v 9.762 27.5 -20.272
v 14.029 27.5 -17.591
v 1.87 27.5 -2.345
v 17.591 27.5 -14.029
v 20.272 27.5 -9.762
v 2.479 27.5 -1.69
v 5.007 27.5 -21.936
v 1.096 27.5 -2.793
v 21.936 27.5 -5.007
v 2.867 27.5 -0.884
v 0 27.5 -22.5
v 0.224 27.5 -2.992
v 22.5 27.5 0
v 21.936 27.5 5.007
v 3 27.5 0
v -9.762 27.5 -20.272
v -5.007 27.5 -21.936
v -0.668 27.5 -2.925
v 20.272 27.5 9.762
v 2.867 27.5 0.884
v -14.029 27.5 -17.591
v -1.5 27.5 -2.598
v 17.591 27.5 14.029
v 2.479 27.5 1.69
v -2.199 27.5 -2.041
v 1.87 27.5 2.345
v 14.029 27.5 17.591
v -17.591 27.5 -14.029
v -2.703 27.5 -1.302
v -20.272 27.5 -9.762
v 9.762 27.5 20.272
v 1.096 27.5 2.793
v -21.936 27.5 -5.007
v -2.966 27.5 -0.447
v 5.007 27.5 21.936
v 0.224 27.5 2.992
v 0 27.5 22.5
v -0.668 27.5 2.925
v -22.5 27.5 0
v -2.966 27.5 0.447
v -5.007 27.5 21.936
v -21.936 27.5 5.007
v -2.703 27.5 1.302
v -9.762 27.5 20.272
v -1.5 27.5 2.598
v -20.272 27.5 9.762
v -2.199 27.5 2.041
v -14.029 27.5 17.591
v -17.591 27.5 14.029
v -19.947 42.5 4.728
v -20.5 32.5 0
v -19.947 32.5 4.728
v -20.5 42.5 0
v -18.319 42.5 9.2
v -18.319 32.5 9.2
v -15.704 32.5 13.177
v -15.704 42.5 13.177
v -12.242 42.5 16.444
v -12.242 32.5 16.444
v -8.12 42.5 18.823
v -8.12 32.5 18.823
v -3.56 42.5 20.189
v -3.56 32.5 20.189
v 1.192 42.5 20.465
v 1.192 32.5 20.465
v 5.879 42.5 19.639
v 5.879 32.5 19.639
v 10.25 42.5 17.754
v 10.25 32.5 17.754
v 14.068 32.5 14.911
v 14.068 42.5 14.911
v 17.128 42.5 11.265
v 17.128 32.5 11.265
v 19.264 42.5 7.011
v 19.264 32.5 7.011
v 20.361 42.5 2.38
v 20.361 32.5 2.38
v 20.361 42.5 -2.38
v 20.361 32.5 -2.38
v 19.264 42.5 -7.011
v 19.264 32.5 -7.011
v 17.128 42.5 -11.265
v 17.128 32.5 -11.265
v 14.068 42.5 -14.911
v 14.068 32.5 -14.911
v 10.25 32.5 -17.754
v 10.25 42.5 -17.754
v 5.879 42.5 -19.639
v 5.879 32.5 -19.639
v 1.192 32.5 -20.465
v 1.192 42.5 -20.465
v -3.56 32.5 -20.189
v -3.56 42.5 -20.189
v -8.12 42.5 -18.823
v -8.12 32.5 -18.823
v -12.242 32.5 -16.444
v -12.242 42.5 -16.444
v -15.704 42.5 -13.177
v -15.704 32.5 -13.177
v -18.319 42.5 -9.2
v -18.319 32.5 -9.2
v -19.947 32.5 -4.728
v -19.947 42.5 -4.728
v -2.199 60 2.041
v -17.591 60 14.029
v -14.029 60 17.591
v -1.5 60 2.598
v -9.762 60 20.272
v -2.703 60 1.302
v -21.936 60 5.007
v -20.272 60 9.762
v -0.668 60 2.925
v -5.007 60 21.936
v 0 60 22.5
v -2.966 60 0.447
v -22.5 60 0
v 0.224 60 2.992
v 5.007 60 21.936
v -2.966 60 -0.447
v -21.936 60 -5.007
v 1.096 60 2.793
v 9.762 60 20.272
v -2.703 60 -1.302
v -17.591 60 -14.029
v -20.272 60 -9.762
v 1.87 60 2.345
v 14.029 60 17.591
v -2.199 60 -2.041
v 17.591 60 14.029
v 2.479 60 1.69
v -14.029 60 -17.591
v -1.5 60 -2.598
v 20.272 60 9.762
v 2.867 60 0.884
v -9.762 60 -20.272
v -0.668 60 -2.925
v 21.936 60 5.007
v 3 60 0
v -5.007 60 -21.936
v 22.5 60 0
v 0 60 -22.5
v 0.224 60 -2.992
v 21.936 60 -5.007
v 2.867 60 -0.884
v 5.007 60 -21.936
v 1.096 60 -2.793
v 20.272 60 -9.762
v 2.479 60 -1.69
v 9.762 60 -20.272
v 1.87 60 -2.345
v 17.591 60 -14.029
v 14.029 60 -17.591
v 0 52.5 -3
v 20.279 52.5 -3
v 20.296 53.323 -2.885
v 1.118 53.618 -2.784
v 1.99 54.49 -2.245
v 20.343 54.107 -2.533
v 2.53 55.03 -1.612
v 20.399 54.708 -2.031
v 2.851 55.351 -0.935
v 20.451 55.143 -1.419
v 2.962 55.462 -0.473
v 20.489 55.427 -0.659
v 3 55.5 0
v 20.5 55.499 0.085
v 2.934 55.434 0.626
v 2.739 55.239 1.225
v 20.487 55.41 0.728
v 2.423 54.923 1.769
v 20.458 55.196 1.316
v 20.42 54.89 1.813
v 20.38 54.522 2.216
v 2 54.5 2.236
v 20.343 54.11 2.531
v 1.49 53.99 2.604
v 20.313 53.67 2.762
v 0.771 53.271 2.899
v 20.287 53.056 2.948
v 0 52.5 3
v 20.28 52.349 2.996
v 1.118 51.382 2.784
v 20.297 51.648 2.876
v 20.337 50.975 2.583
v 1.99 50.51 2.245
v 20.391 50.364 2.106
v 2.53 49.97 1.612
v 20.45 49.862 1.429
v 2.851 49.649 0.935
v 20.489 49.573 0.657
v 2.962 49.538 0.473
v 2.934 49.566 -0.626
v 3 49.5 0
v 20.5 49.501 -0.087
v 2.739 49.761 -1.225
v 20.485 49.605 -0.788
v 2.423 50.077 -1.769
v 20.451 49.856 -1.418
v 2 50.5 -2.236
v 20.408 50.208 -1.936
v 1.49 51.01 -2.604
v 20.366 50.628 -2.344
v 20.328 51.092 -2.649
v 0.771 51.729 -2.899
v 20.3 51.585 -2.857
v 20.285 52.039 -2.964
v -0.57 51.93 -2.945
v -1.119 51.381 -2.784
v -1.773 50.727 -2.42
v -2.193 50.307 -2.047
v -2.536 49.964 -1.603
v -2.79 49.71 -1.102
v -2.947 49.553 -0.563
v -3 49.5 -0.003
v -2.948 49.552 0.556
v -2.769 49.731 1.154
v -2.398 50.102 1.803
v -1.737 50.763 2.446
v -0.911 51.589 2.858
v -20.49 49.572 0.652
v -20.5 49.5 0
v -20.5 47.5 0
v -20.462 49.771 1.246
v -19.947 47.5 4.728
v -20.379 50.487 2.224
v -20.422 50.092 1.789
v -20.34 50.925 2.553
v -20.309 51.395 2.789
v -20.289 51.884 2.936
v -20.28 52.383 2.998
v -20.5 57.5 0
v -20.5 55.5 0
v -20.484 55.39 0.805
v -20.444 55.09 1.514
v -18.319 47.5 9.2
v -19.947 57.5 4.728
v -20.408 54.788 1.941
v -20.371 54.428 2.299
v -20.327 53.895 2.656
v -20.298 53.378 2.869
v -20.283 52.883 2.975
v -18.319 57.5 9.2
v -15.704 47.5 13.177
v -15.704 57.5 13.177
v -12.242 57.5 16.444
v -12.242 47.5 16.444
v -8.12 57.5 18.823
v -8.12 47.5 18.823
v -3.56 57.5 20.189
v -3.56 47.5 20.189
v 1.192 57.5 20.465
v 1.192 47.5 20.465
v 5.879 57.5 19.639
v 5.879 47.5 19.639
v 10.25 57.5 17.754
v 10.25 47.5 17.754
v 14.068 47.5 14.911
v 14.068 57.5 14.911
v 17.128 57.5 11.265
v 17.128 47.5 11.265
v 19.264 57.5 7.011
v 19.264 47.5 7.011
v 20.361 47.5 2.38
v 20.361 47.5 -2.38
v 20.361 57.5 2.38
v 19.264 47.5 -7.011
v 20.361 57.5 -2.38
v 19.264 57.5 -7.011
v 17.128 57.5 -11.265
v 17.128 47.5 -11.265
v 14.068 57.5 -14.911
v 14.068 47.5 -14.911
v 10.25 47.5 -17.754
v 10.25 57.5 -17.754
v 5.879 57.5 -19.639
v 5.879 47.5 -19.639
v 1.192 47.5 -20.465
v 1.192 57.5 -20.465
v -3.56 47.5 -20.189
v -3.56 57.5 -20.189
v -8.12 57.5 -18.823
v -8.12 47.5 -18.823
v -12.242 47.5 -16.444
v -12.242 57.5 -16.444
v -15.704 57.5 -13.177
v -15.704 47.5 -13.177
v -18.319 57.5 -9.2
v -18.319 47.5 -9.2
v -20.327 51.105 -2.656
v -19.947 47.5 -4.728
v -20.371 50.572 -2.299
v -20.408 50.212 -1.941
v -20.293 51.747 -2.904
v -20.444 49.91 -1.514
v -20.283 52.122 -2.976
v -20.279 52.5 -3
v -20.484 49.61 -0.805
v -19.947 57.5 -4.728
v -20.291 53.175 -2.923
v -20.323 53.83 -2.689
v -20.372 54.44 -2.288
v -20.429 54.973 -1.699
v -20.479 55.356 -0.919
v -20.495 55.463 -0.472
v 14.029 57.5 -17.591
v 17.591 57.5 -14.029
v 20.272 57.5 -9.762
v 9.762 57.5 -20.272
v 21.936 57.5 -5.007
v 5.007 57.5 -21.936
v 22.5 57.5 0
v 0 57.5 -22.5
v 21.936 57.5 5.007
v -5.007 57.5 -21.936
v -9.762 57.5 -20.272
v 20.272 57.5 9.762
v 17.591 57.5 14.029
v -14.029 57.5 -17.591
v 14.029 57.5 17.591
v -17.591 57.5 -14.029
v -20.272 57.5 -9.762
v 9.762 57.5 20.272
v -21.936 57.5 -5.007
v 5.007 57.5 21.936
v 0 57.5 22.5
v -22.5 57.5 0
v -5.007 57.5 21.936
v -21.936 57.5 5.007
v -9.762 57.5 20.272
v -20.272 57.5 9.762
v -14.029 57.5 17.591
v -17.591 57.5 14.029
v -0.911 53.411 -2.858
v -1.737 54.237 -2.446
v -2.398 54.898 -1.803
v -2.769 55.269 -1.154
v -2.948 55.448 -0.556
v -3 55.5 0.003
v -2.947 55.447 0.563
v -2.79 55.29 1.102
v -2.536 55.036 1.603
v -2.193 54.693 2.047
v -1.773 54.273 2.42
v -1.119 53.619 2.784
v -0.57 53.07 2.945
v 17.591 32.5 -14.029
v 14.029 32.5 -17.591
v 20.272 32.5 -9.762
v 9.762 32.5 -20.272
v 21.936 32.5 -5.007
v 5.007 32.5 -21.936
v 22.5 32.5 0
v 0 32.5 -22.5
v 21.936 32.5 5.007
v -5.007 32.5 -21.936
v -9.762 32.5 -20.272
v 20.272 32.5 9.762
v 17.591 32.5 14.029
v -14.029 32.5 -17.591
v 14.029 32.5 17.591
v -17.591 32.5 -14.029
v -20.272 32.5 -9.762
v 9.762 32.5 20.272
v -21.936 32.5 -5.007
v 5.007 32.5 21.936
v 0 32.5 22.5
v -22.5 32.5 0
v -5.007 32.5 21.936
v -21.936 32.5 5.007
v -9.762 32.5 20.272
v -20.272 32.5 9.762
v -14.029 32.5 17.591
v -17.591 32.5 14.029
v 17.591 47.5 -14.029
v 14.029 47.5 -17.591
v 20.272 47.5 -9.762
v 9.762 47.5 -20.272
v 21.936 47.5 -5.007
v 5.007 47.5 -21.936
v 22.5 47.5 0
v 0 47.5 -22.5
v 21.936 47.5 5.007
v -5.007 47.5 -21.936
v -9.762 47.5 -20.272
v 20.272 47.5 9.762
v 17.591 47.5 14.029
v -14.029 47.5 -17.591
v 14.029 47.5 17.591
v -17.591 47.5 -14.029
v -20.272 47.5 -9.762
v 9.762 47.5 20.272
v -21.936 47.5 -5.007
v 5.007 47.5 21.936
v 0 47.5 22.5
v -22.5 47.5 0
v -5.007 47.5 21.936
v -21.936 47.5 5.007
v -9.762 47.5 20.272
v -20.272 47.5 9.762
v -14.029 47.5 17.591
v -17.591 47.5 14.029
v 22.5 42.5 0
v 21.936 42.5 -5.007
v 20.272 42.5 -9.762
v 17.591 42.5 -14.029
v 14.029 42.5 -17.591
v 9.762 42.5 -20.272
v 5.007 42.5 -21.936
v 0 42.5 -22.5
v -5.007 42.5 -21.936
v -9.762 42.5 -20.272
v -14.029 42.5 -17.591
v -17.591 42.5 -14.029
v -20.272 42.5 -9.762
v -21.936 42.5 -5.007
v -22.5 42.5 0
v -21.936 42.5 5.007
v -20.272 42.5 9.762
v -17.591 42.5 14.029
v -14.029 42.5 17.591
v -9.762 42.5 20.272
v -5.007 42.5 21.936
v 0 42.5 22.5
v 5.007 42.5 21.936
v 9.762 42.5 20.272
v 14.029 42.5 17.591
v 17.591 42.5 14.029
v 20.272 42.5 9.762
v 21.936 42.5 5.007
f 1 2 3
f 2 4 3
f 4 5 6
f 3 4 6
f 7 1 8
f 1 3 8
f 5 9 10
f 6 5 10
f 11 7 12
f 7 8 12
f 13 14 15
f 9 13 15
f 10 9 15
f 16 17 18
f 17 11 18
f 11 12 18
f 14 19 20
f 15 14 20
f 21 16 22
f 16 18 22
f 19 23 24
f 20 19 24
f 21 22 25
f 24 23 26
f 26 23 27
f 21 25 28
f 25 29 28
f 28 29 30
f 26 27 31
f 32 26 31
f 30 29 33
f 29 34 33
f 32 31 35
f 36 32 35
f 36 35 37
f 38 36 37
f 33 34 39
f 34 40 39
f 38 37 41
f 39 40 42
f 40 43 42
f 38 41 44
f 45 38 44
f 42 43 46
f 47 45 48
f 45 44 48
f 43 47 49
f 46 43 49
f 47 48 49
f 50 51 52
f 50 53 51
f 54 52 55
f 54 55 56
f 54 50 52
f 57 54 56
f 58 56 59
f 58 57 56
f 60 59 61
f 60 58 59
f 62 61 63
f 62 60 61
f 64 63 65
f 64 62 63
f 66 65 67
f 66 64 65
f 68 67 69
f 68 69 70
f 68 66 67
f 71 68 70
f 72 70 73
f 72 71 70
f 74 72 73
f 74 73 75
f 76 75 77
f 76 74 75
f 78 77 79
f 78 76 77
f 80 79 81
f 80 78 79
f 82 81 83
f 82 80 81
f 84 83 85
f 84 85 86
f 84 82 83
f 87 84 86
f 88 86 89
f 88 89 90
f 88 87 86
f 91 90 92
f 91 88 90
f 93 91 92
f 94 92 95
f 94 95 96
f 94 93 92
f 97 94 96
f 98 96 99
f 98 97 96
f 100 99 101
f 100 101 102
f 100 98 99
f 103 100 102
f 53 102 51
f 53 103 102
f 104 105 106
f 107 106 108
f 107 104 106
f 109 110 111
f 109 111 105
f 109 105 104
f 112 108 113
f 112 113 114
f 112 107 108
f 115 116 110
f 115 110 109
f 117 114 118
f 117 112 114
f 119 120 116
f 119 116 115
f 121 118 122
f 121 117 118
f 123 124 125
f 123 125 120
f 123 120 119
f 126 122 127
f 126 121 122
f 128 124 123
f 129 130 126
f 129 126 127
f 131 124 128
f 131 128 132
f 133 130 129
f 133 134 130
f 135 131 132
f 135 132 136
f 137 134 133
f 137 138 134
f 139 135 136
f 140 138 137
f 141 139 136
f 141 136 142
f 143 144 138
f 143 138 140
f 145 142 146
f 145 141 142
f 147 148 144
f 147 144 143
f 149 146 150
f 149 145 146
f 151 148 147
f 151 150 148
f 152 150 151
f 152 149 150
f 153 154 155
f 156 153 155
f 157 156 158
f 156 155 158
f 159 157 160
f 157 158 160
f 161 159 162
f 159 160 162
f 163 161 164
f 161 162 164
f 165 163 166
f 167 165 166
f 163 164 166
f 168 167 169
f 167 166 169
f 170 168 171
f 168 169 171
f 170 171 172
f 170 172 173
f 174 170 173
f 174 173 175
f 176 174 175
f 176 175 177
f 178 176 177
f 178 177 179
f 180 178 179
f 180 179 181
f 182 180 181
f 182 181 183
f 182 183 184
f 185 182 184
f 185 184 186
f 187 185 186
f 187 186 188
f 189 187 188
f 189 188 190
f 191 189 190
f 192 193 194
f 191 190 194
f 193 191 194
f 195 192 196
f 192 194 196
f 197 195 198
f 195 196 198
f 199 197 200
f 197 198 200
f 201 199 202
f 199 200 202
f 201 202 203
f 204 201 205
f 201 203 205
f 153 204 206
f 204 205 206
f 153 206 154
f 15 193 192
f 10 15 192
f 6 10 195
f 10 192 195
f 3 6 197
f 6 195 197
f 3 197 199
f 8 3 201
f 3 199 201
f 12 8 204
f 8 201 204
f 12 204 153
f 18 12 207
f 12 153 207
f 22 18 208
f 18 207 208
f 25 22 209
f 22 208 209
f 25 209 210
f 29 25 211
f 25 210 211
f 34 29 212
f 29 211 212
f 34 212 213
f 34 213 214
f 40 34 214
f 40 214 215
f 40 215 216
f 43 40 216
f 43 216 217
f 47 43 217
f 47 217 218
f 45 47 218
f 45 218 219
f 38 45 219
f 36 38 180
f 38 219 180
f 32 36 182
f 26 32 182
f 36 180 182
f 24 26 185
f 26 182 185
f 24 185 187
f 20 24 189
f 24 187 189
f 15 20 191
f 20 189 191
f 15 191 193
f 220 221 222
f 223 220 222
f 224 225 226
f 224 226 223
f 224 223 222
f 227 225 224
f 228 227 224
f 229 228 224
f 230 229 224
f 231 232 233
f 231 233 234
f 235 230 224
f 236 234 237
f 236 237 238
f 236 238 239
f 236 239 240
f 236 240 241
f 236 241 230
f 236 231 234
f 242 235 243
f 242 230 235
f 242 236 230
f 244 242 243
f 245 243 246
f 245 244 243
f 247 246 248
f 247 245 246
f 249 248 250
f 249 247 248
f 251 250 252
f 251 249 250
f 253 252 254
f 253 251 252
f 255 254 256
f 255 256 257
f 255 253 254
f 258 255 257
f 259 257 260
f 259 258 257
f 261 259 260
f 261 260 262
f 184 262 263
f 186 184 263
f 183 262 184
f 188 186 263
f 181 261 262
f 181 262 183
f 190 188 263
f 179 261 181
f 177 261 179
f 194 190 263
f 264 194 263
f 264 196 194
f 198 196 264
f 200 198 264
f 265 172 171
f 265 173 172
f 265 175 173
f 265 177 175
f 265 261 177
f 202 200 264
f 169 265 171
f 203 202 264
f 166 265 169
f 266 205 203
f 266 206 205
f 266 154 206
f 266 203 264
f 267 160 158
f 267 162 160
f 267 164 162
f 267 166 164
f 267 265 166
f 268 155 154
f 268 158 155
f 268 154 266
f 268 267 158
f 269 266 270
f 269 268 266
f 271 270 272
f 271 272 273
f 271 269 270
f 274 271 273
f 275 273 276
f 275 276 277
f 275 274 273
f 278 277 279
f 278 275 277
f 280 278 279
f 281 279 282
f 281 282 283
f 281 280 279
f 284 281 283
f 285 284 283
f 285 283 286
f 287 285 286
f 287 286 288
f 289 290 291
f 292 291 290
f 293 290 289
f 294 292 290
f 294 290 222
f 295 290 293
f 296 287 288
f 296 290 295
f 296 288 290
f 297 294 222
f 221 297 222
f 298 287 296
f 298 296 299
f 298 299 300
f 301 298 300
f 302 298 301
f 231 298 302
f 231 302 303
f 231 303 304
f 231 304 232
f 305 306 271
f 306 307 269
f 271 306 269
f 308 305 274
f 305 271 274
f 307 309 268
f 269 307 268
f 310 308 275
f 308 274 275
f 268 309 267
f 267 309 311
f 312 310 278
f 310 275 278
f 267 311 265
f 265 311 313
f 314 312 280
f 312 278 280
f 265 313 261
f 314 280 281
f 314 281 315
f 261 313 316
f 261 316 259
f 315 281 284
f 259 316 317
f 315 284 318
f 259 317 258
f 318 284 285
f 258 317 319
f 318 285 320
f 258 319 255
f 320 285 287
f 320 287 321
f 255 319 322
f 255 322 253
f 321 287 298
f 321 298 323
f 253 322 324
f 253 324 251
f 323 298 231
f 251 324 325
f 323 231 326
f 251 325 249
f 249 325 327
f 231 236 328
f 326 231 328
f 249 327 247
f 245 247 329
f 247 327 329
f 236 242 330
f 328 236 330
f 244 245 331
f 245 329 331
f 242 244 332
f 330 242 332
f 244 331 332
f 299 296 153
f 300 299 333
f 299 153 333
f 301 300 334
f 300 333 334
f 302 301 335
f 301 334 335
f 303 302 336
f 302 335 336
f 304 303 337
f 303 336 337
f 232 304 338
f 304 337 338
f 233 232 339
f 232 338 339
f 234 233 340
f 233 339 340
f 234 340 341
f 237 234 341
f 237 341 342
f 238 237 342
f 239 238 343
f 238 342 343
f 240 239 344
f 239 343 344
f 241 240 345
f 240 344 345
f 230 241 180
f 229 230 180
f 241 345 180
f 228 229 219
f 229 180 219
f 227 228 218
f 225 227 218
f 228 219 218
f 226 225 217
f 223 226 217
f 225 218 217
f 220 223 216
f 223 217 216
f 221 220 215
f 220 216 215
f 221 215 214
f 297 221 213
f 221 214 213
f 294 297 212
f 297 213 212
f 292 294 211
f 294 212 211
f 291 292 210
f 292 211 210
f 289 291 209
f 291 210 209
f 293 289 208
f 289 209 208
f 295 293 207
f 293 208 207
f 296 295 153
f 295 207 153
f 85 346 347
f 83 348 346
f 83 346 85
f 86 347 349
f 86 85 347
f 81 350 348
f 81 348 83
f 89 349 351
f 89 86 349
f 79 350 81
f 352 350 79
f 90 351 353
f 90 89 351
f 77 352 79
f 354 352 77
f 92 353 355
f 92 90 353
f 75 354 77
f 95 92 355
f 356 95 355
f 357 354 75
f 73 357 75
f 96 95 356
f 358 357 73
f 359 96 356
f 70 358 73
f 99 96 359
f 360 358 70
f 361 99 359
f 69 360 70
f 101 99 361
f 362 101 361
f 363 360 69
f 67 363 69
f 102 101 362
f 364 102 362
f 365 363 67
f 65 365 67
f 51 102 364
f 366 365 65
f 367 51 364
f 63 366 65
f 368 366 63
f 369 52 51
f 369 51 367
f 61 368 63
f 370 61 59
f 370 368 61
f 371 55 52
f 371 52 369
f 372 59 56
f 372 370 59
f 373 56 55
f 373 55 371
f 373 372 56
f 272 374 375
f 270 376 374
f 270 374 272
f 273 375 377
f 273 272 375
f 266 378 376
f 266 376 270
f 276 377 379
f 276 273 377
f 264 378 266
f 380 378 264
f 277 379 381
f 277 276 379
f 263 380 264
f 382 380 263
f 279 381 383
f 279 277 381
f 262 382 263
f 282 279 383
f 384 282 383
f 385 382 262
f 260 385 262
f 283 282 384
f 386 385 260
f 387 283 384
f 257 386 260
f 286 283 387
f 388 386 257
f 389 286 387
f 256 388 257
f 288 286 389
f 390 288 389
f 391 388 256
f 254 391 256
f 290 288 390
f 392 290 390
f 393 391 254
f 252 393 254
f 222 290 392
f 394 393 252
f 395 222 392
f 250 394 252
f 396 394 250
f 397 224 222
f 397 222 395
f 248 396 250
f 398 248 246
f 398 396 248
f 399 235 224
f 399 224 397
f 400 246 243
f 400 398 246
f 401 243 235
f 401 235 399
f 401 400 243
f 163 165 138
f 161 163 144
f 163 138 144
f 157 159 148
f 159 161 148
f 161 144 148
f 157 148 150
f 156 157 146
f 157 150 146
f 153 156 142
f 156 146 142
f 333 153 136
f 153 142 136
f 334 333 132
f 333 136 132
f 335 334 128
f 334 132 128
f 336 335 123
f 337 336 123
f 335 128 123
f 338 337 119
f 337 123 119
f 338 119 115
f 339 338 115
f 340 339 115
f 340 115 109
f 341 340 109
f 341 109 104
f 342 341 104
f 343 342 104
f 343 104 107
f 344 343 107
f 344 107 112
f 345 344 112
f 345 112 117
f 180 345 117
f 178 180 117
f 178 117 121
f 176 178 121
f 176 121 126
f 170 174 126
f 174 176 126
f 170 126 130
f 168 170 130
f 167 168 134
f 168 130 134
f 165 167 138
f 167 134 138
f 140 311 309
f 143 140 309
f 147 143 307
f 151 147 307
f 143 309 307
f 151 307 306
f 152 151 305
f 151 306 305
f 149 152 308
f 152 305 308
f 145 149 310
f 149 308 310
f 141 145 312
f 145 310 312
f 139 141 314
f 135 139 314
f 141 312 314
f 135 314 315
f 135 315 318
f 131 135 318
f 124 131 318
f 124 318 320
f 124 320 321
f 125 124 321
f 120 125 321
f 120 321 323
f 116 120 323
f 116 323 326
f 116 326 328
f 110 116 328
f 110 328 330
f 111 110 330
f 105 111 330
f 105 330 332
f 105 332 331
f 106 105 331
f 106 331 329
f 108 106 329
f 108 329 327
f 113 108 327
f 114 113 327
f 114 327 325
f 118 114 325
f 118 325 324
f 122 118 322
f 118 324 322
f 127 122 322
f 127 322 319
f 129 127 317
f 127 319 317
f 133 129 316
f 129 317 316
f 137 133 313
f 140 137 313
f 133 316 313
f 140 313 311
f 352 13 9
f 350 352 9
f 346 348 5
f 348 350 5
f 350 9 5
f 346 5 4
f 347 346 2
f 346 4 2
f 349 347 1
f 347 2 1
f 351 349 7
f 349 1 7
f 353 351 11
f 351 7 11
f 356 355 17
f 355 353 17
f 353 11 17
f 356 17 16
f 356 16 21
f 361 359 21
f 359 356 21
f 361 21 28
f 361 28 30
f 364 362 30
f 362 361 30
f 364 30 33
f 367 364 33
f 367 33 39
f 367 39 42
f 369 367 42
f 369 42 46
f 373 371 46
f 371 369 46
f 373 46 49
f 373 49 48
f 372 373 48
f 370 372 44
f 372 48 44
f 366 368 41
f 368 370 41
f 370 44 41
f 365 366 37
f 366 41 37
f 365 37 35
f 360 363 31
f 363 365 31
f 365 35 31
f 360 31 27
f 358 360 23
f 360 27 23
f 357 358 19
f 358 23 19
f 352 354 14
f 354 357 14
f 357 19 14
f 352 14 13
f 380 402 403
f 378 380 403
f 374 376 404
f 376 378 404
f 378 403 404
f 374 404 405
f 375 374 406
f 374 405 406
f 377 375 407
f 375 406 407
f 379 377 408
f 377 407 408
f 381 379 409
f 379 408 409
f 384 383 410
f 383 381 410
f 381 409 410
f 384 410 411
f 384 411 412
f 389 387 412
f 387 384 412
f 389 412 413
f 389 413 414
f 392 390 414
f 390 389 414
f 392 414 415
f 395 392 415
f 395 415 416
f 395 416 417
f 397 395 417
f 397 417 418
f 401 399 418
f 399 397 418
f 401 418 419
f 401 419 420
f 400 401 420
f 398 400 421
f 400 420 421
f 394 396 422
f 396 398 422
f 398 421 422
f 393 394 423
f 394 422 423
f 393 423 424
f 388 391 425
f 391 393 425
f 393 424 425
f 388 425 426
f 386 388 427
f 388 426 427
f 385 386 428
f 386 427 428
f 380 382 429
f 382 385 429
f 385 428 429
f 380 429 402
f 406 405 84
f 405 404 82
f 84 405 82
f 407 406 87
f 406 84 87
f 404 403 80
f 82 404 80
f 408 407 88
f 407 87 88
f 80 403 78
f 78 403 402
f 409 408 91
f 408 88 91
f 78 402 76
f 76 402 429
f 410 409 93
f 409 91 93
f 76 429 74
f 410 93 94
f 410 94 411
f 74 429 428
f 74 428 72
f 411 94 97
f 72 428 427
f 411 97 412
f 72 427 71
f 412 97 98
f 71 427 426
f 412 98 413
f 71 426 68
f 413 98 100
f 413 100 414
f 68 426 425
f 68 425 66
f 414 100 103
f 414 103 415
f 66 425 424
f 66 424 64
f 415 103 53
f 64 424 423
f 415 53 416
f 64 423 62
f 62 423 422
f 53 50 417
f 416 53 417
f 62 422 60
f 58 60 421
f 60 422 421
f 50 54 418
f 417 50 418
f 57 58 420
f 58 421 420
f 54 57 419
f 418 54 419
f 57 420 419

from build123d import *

# Parameters (mm, degrees)
SKETCH1_R               = 22.5
BOSS_EXTRUDE1_DEPTH     = 60
SKETCH2_R               = 15
CUT_EXTRUDE1_DEPTH      = 12
SKETCH6_W               = 2
SKETCH6_H               = 10
SKETCH7_R               = 22.5
CUT_EXTRUDE2_DEPTH      = 27.5
SKETCH8_R               = 15
CUT_EXTRUDE3_DEPTH      = 27.5
SKETCH9_R               = 2
CUT_EXTRUDE5_DEPTH      = 23.5
CUT_EXTRUDE5_DEPTH_BACK = 23.5
SKETCH10_R              = 15
BOSS_EXTRUDE2_DEPTH     = 32.5
SKETCH11_R              = 3
CUT_EXTRUDE8_DEPTH      = 23.5
CUT_EXTRUDE8_DEPTH_BACK = 23.5
SKETCH12_R              = 3
CUT_EXTRUDE9_DEPTH      = 32.5


with BuildPart() as part:
    # Sketch1 → Boss-Extrude1 (new body)
    with BuildSketch(Plane(origin=(0, 0, 0), x_dir=(1, 0, 0), z_dir=(0, 1, 0))):
        Circle(SKETCH1_R)
    extrude(amount=BOSS_EXTRUDE1_DEPTH)

    # Sketch2 → Cut-Extrude1 (cut)
    with BuildSketch(Plane(origin=(0, 60, 0), x_dir=(1, 0, 0), z_dir=(0, 1, 0))):
        Circle(SKETCH2_R)
    extrude(amount=-CUT_EXTRUDE1_DEPTH, mode=Mode.SUBTRACT)

    # Sketch6 → Cut-Revolve1 (revolve, cut)
    with BuildSketch(Plane.XY):
        with Locations((-21.5, 52.5)):
            Rectangle(SKETCH6_W, SKETCH6_H)
        with Locations((-21.5, 37.5)):
            Rectangle(SKETCH6_W, SKETCH6_H)
        with Locations((-21.5, 22.5)):
            Rectangle(SKETCH6_W, SKETCH6_H)
        with Locations((-21.5, 7.5)):
            Rectangle(SKETCH6_W, SKETCH6_H)
    revolve(axis=Axis((0, 0, 0), (0, 1, 0)), mode=Mode.SUBTRACT)

    # Sketch7 → Cut-Extrude2 (cut)
    with BuildSketch(Plane.XZ):
        Circle(SKETCH7_R)
    extrude(amount=-CUT_EXTRUDE2_DEPTH, mode=Mode.SUBTRACT)

    # Sketch8 → Cut-Extrude3 (cut)
    with BuildSketch(Plane(origin=(0, 48, 0), x_dir=(1, 0, 0), z_dir=(0, 1, 0))):
        Circle(SKETCH8_R)
    extrude(amount=-CUT_EXTRUDE3_DEPTH, mode=Mode.SUBTRACT)

    # Sketch9 → Cut-Extrude5 (cut, two sides)
    with BuildSketch(Plane(origin=(0, 0, 0), x_dir=(0, 0, -1), z_dir=(1, 0, 0))) as cut_extrude5_sk:
        with Locations((0, 52.5)):
            Circle(SKETCH9_R)
    extrude(amount=CUT_EXTRUDE5_DEPTH, mode=Mode.SUBTRACT)
    extrude(cut_extrude5_sk.sketch, amount=-CUT_EXTRUDE5_DEPTH_BACK, mode=Mode.SUBTRACT)

    # Sketch10 → Boss-Extrude2 (add)
    with BuildSketch(Plane(origin=(0, 60, 0), x_dir=(1, 0, 0), z_dir=(0, 1, 0))):
        Circle(SKETCH10_R)
    extrude(amount=-BOSS_EXTRUDE2_DEPTH)

    # Sketch11 → Cut-Extrude8 (cut, two sides)
    with BuildSketch(Plane(origin=(0, 0, 0), x_dir=(0, 0, -1), z_dir=(1, 0, 0))) as cut_extrude8_sk:
        with Locations((0, 52.5)):
            Circle(SKETCH11_R)
    extrude(amount=CUT_EXTRUDE8_DEPTH, mode=Mode.SUBTRACT)
    extrude(cut_extrude8_sk.sketch, amount=-CUT_EXTRUDE8_DEPTH_BACK, mode=Mode.SUBTRACT)

    # Sketch12 → Cut-Extrude9 (cut)
    with BuildSketch(Plane(origin=(0, 60, 0), x_dir=(1, 0, 0), z_dir=(0, 1, 0))):
        Circle(SKETCH12_R)
    extrude(amount=-CUT_EXTRUDE9_DEPTH, mode=Mode.SUBTRACT)


solid = part.part
